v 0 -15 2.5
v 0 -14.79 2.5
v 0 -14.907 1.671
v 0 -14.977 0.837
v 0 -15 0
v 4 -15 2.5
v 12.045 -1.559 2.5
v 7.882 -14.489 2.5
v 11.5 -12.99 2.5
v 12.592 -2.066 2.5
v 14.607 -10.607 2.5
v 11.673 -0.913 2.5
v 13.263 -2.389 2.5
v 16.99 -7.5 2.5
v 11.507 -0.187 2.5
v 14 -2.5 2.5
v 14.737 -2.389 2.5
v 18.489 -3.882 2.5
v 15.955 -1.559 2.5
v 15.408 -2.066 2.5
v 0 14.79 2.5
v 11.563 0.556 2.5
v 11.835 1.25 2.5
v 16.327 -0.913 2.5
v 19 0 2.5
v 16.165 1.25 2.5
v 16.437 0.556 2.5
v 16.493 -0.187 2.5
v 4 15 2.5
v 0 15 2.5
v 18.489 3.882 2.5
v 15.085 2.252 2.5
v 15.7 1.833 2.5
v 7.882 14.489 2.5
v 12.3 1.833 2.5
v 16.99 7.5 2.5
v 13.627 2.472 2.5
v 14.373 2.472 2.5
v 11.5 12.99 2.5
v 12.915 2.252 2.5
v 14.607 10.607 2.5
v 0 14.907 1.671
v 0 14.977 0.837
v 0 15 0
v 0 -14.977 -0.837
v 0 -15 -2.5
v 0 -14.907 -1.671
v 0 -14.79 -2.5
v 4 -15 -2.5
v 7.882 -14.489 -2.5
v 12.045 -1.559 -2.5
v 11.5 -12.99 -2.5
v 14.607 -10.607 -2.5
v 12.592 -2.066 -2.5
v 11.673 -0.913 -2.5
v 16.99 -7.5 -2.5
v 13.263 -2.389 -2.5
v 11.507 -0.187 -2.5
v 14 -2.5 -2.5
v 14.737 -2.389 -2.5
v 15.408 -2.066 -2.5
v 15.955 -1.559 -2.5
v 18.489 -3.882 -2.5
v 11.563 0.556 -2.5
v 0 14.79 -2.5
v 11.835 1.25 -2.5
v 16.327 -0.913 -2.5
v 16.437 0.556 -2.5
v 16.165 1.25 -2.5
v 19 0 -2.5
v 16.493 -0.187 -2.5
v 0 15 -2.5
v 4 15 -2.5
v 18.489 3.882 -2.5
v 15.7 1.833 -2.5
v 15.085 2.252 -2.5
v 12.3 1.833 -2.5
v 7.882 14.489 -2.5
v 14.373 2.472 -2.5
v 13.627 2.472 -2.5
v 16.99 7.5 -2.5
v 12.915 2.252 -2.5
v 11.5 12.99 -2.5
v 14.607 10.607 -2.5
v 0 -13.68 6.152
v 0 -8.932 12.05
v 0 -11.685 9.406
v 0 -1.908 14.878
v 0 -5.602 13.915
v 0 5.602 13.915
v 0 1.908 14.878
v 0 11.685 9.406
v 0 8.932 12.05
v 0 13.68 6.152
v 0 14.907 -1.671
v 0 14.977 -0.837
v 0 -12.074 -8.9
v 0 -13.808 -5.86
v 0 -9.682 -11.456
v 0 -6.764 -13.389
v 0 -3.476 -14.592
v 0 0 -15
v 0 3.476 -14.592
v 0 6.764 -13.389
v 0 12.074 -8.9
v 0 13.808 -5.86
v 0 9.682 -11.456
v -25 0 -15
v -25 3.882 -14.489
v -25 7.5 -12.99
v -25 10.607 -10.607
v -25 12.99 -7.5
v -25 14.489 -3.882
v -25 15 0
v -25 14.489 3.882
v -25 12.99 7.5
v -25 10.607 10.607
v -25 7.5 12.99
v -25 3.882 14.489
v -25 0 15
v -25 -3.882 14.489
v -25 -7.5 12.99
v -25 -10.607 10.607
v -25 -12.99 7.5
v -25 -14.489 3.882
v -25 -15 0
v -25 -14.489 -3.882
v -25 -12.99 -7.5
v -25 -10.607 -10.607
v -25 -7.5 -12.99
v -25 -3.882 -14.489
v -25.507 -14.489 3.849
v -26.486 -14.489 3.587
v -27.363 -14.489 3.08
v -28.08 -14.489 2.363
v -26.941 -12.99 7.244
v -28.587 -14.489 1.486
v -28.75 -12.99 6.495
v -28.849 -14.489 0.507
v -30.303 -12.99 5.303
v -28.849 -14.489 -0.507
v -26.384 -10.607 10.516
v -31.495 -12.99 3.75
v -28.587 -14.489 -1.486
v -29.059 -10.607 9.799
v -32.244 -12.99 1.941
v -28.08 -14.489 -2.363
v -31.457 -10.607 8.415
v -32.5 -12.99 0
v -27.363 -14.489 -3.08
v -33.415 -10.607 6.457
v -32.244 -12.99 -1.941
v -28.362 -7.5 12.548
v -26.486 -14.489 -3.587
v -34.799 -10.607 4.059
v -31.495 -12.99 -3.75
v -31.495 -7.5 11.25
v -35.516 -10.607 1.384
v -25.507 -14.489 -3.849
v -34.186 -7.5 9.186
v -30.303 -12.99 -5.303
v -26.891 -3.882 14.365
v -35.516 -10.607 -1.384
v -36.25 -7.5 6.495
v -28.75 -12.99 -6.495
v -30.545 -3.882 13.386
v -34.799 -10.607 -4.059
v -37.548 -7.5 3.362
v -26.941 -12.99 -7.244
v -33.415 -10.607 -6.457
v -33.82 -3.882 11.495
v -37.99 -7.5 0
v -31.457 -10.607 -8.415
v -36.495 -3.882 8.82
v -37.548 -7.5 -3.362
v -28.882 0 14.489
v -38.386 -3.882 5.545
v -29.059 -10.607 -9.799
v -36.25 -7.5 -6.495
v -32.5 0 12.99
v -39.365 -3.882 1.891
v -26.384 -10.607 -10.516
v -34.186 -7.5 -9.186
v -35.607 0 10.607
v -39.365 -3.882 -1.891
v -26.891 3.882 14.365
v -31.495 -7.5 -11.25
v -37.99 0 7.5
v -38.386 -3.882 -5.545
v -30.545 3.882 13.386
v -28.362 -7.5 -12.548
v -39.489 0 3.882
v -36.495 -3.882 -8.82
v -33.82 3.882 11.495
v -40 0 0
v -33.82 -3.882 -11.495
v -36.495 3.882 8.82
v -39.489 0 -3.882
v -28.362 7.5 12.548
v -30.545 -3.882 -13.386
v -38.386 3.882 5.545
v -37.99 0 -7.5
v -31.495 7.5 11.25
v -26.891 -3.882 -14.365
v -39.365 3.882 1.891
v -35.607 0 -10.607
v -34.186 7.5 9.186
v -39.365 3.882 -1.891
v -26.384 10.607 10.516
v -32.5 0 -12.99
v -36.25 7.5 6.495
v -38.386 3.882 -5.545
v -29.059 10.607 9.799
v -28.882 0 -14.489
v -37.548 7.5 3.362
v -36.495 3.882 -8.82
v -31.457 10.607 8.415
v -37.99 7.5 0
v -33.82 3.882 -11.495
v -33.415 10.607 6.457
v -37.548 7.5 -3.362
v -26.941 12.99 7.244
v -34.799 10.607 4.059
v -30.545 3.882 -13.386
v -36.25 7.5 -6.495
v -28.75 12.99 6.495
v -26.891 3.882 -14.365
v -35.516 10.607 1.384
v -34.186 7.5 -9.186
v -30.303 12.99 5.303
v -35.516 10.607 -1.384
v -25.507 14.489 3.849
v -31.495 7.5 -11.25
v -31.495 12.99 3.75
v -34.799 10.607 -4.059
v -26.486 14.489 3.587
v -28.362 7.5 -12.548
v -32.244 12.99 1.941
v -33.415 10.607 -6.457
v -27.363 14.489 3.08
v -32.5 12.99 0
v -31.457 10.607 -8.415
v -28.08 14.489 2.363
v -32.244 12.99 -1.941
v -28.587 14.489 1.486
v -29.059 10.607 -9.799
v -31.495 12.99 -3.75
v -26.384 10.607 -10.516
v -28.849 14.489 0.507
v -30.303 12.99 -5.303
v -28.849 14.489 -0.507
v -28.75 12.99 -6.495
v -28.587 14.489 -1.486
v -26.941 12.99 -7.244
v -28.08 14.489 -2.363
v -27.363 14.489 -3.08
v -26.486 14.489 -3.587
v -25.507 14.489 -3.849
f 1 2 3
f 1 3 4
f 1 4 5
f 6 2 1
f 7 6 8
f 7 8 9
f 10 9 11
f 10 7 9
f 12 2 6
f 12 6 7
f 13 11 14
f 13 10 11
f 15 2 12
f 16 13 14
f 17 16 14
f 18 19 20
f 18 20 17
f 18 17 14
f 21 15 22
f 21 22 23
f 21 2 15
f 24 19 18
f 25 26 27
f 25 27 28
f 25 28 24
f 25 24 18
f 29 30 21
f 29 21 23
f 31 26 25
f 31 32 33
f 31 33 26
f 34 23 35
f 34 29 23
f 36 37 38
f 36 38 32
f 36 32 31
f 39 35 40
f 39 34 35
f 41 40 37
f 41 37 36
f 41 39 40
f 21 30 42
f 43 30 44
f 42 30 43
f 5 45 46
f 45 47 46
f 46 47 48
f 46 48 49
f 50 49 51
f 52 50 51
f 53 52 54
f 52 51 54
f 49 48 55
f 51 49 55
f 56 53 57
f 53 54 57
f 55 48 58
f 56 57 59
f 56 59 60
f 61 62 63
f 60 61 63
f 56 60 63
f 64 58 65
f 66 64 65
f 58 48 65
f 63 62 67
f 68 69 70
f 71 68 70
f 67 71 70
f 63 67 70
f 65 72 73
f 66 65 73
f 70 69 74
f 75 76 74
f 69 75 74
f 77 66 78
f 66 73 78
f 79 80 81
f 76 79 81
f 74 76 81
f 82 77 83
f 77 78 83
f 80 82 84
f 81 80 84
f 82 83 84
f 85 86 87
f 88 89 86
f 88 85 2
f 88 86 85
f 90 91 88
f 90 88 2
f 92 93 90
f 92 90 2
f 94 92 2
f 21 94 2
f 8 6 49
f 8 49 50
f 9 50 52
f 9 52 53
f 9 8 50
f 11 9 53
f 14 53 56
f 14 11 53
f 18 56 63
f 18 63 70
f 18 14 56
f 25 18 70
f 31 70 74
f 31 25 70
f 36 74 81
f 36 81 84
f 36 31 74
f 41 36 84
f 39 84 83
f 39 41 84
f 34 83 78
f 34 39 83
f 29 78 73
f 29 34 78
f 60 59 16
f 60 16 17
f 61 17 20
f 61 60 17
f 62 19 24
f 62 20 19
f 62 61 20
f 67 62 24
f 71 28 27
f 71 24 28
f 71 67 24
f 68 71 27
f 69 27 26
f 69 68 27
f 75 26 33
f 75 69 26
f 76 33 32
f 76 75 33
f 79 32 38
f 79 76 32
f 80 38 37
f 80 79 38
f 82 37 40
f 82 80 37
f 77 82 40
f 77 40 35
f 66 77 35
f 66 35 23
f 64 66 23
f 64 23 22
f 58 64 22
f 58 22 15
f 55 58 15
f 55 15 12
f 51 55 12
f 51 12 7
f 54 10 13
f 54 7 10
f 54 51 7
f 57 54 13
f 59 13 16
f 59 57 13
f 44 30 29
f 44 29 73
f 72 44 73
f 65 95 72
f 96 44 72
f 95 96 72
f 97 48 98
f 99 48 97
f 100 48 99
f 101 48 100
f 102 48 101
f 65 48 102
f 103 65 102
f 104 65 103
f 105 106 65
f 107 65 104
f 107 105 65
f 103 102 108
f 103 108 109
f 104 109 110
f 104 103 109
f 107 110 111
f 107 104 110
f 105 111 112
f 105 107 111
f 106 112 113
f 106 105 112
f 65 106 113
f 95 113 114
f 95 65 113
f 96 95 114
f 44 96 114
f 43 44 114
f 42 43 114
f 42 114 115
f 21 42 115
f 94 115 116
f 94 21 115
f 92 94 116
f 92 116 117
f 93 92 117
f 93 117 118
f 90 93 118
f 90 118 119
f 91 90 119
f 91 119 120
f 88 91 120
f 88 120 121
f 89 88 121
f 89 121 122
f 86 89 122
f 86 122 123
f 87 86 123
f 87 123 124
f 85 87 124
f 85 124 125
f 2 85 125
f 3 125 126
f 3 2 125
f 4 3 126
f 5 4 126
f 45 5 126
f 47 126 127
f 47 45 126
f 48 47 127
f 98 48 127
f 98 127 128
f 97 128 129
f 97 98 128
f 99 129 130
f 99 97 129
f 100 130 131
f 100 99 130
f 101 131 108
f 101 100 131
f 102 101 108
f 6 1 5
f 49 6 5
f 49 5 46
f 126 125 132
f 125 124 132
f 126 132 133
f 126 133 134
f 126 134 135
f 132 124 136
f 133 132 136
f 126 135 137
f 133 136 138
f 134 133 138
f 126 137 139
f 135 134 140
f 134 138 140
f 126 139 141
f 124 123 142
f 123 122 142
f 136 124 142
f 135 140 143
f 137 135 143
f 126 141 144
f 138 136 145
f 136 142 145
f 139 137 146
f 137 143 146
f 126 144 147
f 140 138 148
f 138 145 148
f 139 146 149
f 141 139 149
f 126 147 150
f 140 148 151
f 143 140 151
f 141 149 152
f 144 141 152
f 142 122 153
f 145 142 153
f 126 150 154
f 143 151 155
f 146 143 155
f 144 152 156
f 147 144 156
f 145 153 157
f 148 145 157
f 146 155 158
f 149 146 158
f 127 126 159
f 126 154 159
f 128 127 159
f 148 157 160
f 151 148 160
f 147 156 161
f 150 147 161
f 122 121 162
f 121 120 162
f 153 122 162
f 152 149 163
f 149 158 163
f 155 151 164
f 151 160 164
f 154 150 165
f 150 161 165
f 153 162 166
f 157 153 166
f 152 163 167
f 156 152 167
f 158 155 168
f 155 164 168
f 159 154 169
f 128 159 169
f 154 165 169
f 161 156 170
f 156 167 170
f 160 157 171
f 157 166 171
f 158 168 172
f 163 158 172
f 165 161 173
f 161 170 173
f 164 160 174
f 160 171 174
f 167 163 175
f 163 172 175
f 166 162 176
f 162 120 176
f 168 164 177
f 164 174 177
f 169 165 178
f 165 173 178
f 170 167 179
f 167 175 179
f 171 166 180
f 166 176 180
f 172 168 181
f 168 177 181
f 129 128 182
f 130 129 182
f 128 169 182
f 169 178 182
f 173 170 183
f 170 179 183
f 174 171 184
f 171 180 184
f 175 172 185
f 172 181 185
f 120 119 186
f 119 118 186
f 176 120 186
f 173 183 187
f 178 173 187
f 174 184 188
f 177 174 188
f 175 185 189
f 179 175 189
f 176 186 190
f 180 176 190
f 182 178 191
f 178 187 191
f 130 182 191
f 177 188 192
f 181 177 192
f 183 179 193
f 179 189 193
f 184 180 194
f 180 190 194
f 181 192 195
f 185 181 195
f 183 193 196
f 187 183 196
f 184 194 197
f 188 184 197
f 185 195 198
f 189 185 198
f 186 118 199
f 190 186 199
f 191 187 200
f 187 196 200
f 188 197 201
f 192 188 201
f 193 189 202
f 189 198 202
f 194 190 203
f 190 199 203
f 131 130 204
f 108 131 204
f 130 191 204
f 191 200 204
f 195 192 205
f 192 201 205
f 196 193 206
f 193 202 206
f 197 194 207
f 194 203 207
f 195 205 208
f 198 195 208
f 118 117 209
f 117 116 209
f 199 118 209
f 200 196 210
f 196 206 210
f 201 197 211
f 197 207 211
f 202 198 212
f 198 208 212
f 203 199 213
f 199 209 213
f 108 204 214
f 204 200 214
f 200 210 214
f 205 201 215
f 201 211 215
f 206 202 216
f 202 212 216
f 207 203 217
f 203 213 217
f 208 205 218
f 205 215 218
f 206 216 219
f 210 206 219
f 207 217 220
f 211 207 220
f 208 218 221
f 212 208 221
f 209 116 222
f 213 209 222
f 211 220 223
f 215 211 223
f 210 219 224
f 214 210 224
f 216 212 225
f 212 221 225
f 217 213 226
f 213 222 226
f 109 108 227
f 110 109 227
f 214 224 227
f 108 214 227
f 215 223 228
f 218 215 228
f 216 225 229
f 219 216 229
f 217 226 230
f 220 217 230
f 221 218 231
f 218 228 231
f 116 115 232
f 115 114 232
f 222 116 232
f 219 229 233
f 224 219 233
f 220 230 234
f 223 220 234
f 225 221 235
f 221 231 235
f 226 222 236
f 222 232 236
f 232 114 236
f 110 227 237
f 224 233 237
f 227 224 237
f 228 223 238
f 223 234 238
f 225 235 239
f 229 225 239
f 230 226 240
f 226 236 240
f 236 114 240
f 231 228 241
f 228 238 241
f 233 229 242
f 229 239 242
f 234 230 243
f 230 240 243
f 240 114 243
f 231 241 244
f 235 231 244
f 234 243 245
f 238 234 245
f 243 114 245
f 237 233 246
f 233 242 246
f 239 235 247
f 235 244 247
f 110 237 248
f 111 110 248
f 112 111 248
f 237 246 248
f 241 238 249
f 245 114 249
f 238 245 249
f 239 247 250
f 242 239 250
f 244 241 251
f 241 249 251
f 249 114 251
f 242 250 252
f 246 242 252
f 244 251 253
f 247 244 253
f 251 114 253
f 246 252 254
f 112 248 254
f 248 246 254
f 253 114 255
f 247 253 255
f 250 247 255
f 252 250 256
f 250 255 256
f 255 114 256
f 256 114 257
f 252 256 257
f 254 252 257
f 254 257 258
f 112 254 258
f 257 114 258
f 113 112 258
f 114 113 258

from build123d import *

# Parameters (mm, degrees)
SKETCH2_R               = 15
BOSS_EXTRUDE1_DEPTH     = 25
SKETCH7_W               = 5
SKETCH7_H               = 30
BOSS_EXTRUDE2_DEPTH     = 4
BOSS_EXTRUDE3_DEPTH     = 5
CUT_EXTRUDE3_DEPTH      = 35.003676272
CUT_EXTRUDE3_DEPTH_BACK = 35.003676272
SKETCH9_R               = 2.5


with BuildPart() as part:
    # Sketch2 → Boss-Extrude1 (new body)
    with BuildSketch(Plane(origin=(0, 0, 0), x_dir=(0, 0, -1), z_dir=(1, 0, 0))):
        Circle(SKETCH2_R)
    extrude(amount=-BOSS_EXTRUDE1_DEPTH)

    # Sketch7 → Boss-Extrude2 (add)
    with BuildSketch(Plane(origin=(0, 0, 0), x_dir=(0, 0, -1), z_dir=(1, 0, 0))):
        Rectangle(SKETCH7_W, SKETCH7_H)
    extrude(amount=BOSS_EXTRUDE2_DEPTH)

    # Sketch8 → Boss-Extrude3 (add)
    with BuildSketch(Plane.XY.offset(2.5)):
        with BuildLine():
            Line((4, 15), (4, -15))
            ThreePointArc((4, -15), (19, 0), (4, 15))
        make_face()
    extrude(amount=-BOSS_EXTRUDE3_DEPTH)

    # Sketch9 → Cut-Extrude3 (cut, two sides: drawn at the far end of the back side and taken through both)
    with BuildSketch(Plane.XY.offset(2.5).offset(-CUT_EXTRUDE3_DEPTH_BACK)):
        with Locations(Location((14, 0, 0), (0, 0, 270))):
            Circle(SKETCH9_R)
    extrude(amount=CUT_EXTRUDE3_DEPTH + CUT_EXTRUDE3_DEPTH_BACK, mode=Mode.SUBTRACT)

    # Sketch10 → Revolve1 (revolve)
    with BuildSketch(Plane.ZY.offset(25)):
        with BuildLine():
            Line((0, 15), (0, -15))
            ThreePointArc((0, -15), (15, 0), (0, 15))
        make_face()
    revolve(axis=Axis((-25, 15, 0), (0, -1, 0)))


solid = part.part
